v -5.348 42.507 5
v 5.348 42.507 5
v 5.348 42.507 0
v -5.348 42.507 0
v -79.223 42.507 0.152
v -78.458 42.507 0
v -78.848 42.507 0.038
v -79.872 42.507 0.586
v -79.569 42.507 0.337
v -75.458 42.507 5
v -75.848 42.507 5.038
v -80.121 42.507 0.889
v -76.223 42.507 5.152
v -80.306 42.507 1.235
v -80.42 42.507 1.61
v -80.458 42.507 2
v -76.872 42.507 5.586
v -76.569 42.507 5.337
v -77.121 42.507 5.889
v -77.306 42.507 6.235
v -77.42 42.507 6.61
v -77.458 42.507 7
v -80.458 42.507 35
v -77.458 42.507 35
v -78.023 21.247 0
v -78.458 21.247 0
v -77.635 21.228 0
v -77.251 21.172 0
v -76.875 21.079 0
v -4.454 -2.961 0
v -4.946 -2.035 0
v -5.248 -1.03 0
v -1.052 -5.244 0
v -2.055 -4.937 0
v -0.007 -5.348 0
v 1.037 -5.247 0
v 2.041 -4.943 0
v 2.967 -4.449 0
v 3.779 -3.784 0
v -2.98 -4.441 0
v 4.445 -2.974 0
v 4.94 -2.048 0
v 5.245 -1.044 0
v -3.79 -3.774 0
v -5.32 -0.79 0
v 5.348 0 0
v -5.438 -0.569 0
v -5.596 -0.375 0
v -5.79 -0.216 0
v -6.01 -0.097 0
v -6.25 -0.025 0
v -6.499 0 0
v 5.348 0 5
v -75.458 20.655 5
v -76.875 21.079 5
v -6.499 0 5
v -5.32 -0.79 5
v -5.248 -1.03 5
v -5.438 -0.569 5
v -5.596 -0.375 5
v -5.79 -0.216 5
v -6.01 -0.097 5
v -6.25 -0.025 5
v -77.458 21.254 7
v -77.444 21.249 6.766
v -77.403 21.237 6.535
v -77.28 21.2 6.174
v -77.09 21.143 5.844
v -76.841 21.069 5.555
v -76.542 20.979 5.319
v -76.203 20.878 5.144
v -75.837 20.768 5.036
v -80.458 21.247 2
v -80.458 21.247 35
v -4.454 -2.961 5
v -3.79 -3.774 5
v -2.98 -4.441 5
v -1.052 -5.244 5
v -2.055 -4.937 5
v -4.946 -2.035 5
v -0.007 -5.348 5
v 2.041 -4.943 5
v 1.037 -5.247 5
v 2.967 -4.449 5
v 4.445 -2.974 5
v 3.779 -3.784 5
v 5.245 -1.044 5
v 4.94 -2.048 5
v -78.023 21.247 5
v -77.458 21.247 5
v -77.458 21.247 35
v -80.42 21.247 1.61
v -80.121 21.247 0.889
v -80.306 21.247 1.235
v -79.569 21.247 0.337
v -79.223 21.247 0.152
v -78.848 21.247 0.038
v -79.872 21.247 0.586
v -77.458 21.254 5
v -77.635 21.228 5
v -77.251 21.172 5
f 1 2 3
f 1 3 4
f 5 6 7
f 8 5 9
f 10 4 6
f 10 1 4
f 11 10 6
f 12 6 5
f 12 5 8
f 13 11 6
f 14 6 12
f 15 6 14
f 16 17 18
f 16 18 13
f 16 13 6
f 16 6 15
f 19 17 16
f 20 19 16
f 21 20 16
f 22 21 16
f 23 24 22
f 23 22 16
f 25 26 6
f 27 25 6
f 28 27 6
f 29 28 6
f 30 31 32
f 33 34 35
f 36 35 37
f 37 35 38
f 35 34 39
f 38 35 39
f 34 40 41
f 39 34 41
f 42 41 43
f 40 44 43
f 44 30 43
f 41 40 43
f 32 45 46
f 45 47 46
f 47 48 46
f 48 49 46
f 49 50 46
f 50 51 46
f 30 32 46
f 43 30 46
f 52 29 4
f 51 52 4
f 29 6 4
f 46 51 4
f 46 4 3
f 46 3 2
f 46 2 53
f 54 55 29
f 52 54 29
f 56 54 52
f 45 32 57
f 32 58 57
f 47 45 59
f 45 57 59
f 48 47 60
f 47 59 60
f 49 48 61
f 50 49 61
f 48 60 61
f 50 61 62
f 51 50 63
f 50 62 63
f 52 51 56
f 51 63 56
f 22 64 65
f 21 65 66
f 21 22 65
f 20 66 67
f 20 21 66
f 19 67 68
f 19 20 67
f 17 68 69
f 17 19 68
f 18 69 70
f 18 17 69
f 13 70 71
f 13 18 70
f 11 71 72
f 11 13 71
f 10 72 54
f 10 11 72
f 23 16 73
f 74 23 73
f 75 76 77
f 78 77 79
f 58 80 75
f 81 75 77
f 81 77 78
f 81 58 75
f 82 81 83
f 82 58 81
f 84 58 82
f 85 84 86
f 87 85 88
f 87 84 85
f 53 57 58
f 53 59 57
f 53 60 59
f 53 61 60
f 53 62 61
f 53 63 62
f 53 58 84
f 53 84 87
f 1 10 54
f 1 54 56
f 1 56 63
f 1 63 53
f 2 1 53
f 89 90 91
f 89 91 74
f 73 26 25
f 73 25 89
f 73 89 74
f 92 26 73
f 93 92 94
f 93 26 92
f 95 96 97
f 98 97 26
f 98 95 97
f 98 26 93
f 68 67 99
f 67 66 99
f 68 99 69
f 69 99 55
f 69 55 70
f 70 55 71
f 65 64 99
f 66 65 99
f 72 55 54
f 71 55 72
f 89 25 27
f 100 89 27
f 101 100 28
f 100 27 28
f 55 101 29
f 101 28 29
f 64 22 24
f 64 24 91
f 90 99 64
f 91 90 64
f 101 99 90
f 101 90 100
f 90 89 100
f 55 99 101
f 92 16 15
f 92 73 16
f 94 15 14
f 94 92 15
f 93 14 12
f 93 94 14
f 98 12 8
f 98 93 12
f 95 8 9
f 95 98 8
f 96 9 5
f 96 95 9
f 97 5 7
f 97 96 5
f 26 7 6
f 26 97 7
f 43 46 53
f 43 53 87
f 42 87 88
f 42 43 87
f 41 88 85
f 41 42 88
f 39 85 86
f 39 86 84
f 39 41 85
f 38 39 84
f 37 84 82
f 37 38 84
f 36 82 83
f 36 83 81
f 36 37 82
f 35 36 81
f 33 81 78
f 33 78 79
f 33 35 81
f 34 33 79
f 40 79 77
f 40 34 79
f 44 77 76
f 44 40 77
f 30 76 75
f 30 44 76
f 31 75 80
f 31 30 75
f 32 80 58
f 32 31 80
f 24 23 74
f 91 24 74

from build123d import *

# Parameters (mm, degrees)
ESTRUSIONE_ESTRUSIONE1_DEPTH = 5
SCHIZZO2_W                   = 72.109898292
SCHIZZO2_H                   = 42.507089678
ESTRUSIONE_ESTRUSIONE2_DEPTH = 5
SCHIZZO3_W                   = 10.696209694
SCHIZZO3_H                   = 5.348104847
ESTRUSIONE_ESTRUSIONE3_DEPTH = 5
RACCORDO1_R                  = 1.275157777
TAGLIO_ESTRUSIONE1_DEPTH     = 5
SCHIZZO6_W                   = 21.26
SCHIZZO6_H                   = 3
ESTRUSIONE_ESTRUSIONE4_DEPTH = 35
RACCORDO9_DEPTH              = 5
RACCORDO14_R                 = 2
RACCORDO15_R                 = 2


with BuildPart() as part:
    # Schizzo1 → Estrusione-Estrusione1 (new body)
    with BuildSketch(Plane.XY):
        with BuildLine():
            Line((-5.348104847, 0), (-5.348104847, 37.158984831))
            ThreePointArc((-5.348104847, 37.158984831), (0, 42.507089678), (5.348104847, 37.158984831))
            Line((5.348104847, 37.158984831), (5.348104847, 0))
            ThreePointArc((5.348104847, 0), (0, -5.348104847), (-5.348104847, 0))
        make_face()
    extrude(amount=ESTRUSIONE_ESTRUSIONE1_DEPTH)

    # Schizzo2 → Estrusione-Estrusione2 (add)
    with BuildSketch(Plane.XY):
        with Locations((-41.403053993, 21.253544839)):
            Rectangle(SCHIZZO2_W, SCHIZZO2_H)
    extrude(amount=ESTRUSIONE_ESTRUSIONE2_DEPTH)

    # Schizzo3 → Estrusione-Estrusione3 (add)
    with BuildSketch(Plane.XY.offset(5)):
        with Locations((0, 39.833037254)):
            Rectangle(SCHIZZO3_W, SCHIZZO3_H)
    extrude(amount=-ESTRUSIONE_ESTRUSIONE3_DEPTH)

    # Raccordo1
    raccordo1_edges = [part.edges().sort_by_distance(p)[0] for p in [
        (-5.348104847, 0, 2.5),
    ]]
    fillet(raccordo1_edges, radius=RACCORDO1_R)

    # Schizzo5 → Taglio-Estrusione1 (cut)
    with BuildSketch(Plane.XY.offset(5)):
        Polygon((-77.458003139, 21.253544839), (-6.499352309, 0), (-77.458003139, 0), align=None)
    extrude(amount=-TAGLIO_ESTRUSIONE1_DEPTH, mode=Mode.SUBTRACT)

    # Schizzo6 → Estrusione-Estrusione4 (add)
    with BuildSketch(Plane(origin=(0, 0, 0), x_dir=(0, -1, 0), z_dir=(0, 0, -1))):
        with Locations((-31.877089678, 78.958003139)):
            Rectangle(SCHIZZO6_W, SCHIZZO6_H)
    extrude(amount=-ESTRUSIONE_ESTRUSIONE4_DEPTH)

    # Raccordo9: read off the stored shape, not the designer's step
    # Raccordo9 outline → Raccordo9 (add)
    with BuildSketch(Plane.XY):
        with BuildLine():
            ThreePointArc((-78.02262727, 21.247089678), (-77.442645969, 21.204819039), (-76.874922759, 21.078900524))
            Line((-76.874922759, 21.078900524), (-77.458003139, 21.253544839))
            Line((-77.458003139, 21.253544839), (-77.458003139, 21.247089678))
            Line((-77.458003139, 21.247089678), (-78.02262727, 21.247089678))
        make_face()
    extrude(amount=RACCORDO9_DEPTH)

    # Raccordo14
    raccordo14_edges = [part.edges().sort_by_distance(p)[0] for p in [
        (-80.458003139, 31.877089678, 0),
    ]]
    fillet(raccordo14_edges, radius=RACCORDO14_R)

    # Raccordo15
    # the kernel refuses this fillet: 2 mm, written as the material it adds along each edge
    with BuildSketch(Plane(origin=(-77.458003139, 42.507089678, 5), x_dir=(1, 0, 0), z_dir=(0, -1, 0))) as raccordo15_piece_1:
        with BuildLine():
            CenterArc((RACCORDO15_R, RACCORDO15_R), RACCORDO15_R, 180, 90)
            Line((0, RACCORDO15_R), (0, 0))
            Line((0, 0), (RACCORDO15_R, 0))
        make_face()
    extrude(amount=21.253544839)
    with BuildSketch(Plane(origin=(-77.458003139, 21.253544839, 5), x_dir=(1, 0, 0), z_dir=(0, -1, 0))) as raccordo15_piece_2_section:
        with BuildLine():
            CenterArc((RACCORDO15_R, RACCORDO15_R), RACCORDO15_R, 180, 90)
            Line((RACCORDO15_R * 9.50990397541e-11, RACCORDO15_R), (0, 0))
            Line((0, 0), (RACCORDO15_R, 0))
        make_face()
    raccordo15_piece_2 = extrude(amount=5.006455161, mode=Mode.PRIVATE)
    raccordo15_piece_2 = split(raccordo15_piece_2, bisect_by=Plane(origin=(-77.458003139, 21.253544839, 5), z_dir=(0.2869261276439439, 0.957952711398246, 0)), keep=Keep.TOP, mode=Mode.PRIVATE)
    add(raccordo15_piece_2)


solid = part.part
